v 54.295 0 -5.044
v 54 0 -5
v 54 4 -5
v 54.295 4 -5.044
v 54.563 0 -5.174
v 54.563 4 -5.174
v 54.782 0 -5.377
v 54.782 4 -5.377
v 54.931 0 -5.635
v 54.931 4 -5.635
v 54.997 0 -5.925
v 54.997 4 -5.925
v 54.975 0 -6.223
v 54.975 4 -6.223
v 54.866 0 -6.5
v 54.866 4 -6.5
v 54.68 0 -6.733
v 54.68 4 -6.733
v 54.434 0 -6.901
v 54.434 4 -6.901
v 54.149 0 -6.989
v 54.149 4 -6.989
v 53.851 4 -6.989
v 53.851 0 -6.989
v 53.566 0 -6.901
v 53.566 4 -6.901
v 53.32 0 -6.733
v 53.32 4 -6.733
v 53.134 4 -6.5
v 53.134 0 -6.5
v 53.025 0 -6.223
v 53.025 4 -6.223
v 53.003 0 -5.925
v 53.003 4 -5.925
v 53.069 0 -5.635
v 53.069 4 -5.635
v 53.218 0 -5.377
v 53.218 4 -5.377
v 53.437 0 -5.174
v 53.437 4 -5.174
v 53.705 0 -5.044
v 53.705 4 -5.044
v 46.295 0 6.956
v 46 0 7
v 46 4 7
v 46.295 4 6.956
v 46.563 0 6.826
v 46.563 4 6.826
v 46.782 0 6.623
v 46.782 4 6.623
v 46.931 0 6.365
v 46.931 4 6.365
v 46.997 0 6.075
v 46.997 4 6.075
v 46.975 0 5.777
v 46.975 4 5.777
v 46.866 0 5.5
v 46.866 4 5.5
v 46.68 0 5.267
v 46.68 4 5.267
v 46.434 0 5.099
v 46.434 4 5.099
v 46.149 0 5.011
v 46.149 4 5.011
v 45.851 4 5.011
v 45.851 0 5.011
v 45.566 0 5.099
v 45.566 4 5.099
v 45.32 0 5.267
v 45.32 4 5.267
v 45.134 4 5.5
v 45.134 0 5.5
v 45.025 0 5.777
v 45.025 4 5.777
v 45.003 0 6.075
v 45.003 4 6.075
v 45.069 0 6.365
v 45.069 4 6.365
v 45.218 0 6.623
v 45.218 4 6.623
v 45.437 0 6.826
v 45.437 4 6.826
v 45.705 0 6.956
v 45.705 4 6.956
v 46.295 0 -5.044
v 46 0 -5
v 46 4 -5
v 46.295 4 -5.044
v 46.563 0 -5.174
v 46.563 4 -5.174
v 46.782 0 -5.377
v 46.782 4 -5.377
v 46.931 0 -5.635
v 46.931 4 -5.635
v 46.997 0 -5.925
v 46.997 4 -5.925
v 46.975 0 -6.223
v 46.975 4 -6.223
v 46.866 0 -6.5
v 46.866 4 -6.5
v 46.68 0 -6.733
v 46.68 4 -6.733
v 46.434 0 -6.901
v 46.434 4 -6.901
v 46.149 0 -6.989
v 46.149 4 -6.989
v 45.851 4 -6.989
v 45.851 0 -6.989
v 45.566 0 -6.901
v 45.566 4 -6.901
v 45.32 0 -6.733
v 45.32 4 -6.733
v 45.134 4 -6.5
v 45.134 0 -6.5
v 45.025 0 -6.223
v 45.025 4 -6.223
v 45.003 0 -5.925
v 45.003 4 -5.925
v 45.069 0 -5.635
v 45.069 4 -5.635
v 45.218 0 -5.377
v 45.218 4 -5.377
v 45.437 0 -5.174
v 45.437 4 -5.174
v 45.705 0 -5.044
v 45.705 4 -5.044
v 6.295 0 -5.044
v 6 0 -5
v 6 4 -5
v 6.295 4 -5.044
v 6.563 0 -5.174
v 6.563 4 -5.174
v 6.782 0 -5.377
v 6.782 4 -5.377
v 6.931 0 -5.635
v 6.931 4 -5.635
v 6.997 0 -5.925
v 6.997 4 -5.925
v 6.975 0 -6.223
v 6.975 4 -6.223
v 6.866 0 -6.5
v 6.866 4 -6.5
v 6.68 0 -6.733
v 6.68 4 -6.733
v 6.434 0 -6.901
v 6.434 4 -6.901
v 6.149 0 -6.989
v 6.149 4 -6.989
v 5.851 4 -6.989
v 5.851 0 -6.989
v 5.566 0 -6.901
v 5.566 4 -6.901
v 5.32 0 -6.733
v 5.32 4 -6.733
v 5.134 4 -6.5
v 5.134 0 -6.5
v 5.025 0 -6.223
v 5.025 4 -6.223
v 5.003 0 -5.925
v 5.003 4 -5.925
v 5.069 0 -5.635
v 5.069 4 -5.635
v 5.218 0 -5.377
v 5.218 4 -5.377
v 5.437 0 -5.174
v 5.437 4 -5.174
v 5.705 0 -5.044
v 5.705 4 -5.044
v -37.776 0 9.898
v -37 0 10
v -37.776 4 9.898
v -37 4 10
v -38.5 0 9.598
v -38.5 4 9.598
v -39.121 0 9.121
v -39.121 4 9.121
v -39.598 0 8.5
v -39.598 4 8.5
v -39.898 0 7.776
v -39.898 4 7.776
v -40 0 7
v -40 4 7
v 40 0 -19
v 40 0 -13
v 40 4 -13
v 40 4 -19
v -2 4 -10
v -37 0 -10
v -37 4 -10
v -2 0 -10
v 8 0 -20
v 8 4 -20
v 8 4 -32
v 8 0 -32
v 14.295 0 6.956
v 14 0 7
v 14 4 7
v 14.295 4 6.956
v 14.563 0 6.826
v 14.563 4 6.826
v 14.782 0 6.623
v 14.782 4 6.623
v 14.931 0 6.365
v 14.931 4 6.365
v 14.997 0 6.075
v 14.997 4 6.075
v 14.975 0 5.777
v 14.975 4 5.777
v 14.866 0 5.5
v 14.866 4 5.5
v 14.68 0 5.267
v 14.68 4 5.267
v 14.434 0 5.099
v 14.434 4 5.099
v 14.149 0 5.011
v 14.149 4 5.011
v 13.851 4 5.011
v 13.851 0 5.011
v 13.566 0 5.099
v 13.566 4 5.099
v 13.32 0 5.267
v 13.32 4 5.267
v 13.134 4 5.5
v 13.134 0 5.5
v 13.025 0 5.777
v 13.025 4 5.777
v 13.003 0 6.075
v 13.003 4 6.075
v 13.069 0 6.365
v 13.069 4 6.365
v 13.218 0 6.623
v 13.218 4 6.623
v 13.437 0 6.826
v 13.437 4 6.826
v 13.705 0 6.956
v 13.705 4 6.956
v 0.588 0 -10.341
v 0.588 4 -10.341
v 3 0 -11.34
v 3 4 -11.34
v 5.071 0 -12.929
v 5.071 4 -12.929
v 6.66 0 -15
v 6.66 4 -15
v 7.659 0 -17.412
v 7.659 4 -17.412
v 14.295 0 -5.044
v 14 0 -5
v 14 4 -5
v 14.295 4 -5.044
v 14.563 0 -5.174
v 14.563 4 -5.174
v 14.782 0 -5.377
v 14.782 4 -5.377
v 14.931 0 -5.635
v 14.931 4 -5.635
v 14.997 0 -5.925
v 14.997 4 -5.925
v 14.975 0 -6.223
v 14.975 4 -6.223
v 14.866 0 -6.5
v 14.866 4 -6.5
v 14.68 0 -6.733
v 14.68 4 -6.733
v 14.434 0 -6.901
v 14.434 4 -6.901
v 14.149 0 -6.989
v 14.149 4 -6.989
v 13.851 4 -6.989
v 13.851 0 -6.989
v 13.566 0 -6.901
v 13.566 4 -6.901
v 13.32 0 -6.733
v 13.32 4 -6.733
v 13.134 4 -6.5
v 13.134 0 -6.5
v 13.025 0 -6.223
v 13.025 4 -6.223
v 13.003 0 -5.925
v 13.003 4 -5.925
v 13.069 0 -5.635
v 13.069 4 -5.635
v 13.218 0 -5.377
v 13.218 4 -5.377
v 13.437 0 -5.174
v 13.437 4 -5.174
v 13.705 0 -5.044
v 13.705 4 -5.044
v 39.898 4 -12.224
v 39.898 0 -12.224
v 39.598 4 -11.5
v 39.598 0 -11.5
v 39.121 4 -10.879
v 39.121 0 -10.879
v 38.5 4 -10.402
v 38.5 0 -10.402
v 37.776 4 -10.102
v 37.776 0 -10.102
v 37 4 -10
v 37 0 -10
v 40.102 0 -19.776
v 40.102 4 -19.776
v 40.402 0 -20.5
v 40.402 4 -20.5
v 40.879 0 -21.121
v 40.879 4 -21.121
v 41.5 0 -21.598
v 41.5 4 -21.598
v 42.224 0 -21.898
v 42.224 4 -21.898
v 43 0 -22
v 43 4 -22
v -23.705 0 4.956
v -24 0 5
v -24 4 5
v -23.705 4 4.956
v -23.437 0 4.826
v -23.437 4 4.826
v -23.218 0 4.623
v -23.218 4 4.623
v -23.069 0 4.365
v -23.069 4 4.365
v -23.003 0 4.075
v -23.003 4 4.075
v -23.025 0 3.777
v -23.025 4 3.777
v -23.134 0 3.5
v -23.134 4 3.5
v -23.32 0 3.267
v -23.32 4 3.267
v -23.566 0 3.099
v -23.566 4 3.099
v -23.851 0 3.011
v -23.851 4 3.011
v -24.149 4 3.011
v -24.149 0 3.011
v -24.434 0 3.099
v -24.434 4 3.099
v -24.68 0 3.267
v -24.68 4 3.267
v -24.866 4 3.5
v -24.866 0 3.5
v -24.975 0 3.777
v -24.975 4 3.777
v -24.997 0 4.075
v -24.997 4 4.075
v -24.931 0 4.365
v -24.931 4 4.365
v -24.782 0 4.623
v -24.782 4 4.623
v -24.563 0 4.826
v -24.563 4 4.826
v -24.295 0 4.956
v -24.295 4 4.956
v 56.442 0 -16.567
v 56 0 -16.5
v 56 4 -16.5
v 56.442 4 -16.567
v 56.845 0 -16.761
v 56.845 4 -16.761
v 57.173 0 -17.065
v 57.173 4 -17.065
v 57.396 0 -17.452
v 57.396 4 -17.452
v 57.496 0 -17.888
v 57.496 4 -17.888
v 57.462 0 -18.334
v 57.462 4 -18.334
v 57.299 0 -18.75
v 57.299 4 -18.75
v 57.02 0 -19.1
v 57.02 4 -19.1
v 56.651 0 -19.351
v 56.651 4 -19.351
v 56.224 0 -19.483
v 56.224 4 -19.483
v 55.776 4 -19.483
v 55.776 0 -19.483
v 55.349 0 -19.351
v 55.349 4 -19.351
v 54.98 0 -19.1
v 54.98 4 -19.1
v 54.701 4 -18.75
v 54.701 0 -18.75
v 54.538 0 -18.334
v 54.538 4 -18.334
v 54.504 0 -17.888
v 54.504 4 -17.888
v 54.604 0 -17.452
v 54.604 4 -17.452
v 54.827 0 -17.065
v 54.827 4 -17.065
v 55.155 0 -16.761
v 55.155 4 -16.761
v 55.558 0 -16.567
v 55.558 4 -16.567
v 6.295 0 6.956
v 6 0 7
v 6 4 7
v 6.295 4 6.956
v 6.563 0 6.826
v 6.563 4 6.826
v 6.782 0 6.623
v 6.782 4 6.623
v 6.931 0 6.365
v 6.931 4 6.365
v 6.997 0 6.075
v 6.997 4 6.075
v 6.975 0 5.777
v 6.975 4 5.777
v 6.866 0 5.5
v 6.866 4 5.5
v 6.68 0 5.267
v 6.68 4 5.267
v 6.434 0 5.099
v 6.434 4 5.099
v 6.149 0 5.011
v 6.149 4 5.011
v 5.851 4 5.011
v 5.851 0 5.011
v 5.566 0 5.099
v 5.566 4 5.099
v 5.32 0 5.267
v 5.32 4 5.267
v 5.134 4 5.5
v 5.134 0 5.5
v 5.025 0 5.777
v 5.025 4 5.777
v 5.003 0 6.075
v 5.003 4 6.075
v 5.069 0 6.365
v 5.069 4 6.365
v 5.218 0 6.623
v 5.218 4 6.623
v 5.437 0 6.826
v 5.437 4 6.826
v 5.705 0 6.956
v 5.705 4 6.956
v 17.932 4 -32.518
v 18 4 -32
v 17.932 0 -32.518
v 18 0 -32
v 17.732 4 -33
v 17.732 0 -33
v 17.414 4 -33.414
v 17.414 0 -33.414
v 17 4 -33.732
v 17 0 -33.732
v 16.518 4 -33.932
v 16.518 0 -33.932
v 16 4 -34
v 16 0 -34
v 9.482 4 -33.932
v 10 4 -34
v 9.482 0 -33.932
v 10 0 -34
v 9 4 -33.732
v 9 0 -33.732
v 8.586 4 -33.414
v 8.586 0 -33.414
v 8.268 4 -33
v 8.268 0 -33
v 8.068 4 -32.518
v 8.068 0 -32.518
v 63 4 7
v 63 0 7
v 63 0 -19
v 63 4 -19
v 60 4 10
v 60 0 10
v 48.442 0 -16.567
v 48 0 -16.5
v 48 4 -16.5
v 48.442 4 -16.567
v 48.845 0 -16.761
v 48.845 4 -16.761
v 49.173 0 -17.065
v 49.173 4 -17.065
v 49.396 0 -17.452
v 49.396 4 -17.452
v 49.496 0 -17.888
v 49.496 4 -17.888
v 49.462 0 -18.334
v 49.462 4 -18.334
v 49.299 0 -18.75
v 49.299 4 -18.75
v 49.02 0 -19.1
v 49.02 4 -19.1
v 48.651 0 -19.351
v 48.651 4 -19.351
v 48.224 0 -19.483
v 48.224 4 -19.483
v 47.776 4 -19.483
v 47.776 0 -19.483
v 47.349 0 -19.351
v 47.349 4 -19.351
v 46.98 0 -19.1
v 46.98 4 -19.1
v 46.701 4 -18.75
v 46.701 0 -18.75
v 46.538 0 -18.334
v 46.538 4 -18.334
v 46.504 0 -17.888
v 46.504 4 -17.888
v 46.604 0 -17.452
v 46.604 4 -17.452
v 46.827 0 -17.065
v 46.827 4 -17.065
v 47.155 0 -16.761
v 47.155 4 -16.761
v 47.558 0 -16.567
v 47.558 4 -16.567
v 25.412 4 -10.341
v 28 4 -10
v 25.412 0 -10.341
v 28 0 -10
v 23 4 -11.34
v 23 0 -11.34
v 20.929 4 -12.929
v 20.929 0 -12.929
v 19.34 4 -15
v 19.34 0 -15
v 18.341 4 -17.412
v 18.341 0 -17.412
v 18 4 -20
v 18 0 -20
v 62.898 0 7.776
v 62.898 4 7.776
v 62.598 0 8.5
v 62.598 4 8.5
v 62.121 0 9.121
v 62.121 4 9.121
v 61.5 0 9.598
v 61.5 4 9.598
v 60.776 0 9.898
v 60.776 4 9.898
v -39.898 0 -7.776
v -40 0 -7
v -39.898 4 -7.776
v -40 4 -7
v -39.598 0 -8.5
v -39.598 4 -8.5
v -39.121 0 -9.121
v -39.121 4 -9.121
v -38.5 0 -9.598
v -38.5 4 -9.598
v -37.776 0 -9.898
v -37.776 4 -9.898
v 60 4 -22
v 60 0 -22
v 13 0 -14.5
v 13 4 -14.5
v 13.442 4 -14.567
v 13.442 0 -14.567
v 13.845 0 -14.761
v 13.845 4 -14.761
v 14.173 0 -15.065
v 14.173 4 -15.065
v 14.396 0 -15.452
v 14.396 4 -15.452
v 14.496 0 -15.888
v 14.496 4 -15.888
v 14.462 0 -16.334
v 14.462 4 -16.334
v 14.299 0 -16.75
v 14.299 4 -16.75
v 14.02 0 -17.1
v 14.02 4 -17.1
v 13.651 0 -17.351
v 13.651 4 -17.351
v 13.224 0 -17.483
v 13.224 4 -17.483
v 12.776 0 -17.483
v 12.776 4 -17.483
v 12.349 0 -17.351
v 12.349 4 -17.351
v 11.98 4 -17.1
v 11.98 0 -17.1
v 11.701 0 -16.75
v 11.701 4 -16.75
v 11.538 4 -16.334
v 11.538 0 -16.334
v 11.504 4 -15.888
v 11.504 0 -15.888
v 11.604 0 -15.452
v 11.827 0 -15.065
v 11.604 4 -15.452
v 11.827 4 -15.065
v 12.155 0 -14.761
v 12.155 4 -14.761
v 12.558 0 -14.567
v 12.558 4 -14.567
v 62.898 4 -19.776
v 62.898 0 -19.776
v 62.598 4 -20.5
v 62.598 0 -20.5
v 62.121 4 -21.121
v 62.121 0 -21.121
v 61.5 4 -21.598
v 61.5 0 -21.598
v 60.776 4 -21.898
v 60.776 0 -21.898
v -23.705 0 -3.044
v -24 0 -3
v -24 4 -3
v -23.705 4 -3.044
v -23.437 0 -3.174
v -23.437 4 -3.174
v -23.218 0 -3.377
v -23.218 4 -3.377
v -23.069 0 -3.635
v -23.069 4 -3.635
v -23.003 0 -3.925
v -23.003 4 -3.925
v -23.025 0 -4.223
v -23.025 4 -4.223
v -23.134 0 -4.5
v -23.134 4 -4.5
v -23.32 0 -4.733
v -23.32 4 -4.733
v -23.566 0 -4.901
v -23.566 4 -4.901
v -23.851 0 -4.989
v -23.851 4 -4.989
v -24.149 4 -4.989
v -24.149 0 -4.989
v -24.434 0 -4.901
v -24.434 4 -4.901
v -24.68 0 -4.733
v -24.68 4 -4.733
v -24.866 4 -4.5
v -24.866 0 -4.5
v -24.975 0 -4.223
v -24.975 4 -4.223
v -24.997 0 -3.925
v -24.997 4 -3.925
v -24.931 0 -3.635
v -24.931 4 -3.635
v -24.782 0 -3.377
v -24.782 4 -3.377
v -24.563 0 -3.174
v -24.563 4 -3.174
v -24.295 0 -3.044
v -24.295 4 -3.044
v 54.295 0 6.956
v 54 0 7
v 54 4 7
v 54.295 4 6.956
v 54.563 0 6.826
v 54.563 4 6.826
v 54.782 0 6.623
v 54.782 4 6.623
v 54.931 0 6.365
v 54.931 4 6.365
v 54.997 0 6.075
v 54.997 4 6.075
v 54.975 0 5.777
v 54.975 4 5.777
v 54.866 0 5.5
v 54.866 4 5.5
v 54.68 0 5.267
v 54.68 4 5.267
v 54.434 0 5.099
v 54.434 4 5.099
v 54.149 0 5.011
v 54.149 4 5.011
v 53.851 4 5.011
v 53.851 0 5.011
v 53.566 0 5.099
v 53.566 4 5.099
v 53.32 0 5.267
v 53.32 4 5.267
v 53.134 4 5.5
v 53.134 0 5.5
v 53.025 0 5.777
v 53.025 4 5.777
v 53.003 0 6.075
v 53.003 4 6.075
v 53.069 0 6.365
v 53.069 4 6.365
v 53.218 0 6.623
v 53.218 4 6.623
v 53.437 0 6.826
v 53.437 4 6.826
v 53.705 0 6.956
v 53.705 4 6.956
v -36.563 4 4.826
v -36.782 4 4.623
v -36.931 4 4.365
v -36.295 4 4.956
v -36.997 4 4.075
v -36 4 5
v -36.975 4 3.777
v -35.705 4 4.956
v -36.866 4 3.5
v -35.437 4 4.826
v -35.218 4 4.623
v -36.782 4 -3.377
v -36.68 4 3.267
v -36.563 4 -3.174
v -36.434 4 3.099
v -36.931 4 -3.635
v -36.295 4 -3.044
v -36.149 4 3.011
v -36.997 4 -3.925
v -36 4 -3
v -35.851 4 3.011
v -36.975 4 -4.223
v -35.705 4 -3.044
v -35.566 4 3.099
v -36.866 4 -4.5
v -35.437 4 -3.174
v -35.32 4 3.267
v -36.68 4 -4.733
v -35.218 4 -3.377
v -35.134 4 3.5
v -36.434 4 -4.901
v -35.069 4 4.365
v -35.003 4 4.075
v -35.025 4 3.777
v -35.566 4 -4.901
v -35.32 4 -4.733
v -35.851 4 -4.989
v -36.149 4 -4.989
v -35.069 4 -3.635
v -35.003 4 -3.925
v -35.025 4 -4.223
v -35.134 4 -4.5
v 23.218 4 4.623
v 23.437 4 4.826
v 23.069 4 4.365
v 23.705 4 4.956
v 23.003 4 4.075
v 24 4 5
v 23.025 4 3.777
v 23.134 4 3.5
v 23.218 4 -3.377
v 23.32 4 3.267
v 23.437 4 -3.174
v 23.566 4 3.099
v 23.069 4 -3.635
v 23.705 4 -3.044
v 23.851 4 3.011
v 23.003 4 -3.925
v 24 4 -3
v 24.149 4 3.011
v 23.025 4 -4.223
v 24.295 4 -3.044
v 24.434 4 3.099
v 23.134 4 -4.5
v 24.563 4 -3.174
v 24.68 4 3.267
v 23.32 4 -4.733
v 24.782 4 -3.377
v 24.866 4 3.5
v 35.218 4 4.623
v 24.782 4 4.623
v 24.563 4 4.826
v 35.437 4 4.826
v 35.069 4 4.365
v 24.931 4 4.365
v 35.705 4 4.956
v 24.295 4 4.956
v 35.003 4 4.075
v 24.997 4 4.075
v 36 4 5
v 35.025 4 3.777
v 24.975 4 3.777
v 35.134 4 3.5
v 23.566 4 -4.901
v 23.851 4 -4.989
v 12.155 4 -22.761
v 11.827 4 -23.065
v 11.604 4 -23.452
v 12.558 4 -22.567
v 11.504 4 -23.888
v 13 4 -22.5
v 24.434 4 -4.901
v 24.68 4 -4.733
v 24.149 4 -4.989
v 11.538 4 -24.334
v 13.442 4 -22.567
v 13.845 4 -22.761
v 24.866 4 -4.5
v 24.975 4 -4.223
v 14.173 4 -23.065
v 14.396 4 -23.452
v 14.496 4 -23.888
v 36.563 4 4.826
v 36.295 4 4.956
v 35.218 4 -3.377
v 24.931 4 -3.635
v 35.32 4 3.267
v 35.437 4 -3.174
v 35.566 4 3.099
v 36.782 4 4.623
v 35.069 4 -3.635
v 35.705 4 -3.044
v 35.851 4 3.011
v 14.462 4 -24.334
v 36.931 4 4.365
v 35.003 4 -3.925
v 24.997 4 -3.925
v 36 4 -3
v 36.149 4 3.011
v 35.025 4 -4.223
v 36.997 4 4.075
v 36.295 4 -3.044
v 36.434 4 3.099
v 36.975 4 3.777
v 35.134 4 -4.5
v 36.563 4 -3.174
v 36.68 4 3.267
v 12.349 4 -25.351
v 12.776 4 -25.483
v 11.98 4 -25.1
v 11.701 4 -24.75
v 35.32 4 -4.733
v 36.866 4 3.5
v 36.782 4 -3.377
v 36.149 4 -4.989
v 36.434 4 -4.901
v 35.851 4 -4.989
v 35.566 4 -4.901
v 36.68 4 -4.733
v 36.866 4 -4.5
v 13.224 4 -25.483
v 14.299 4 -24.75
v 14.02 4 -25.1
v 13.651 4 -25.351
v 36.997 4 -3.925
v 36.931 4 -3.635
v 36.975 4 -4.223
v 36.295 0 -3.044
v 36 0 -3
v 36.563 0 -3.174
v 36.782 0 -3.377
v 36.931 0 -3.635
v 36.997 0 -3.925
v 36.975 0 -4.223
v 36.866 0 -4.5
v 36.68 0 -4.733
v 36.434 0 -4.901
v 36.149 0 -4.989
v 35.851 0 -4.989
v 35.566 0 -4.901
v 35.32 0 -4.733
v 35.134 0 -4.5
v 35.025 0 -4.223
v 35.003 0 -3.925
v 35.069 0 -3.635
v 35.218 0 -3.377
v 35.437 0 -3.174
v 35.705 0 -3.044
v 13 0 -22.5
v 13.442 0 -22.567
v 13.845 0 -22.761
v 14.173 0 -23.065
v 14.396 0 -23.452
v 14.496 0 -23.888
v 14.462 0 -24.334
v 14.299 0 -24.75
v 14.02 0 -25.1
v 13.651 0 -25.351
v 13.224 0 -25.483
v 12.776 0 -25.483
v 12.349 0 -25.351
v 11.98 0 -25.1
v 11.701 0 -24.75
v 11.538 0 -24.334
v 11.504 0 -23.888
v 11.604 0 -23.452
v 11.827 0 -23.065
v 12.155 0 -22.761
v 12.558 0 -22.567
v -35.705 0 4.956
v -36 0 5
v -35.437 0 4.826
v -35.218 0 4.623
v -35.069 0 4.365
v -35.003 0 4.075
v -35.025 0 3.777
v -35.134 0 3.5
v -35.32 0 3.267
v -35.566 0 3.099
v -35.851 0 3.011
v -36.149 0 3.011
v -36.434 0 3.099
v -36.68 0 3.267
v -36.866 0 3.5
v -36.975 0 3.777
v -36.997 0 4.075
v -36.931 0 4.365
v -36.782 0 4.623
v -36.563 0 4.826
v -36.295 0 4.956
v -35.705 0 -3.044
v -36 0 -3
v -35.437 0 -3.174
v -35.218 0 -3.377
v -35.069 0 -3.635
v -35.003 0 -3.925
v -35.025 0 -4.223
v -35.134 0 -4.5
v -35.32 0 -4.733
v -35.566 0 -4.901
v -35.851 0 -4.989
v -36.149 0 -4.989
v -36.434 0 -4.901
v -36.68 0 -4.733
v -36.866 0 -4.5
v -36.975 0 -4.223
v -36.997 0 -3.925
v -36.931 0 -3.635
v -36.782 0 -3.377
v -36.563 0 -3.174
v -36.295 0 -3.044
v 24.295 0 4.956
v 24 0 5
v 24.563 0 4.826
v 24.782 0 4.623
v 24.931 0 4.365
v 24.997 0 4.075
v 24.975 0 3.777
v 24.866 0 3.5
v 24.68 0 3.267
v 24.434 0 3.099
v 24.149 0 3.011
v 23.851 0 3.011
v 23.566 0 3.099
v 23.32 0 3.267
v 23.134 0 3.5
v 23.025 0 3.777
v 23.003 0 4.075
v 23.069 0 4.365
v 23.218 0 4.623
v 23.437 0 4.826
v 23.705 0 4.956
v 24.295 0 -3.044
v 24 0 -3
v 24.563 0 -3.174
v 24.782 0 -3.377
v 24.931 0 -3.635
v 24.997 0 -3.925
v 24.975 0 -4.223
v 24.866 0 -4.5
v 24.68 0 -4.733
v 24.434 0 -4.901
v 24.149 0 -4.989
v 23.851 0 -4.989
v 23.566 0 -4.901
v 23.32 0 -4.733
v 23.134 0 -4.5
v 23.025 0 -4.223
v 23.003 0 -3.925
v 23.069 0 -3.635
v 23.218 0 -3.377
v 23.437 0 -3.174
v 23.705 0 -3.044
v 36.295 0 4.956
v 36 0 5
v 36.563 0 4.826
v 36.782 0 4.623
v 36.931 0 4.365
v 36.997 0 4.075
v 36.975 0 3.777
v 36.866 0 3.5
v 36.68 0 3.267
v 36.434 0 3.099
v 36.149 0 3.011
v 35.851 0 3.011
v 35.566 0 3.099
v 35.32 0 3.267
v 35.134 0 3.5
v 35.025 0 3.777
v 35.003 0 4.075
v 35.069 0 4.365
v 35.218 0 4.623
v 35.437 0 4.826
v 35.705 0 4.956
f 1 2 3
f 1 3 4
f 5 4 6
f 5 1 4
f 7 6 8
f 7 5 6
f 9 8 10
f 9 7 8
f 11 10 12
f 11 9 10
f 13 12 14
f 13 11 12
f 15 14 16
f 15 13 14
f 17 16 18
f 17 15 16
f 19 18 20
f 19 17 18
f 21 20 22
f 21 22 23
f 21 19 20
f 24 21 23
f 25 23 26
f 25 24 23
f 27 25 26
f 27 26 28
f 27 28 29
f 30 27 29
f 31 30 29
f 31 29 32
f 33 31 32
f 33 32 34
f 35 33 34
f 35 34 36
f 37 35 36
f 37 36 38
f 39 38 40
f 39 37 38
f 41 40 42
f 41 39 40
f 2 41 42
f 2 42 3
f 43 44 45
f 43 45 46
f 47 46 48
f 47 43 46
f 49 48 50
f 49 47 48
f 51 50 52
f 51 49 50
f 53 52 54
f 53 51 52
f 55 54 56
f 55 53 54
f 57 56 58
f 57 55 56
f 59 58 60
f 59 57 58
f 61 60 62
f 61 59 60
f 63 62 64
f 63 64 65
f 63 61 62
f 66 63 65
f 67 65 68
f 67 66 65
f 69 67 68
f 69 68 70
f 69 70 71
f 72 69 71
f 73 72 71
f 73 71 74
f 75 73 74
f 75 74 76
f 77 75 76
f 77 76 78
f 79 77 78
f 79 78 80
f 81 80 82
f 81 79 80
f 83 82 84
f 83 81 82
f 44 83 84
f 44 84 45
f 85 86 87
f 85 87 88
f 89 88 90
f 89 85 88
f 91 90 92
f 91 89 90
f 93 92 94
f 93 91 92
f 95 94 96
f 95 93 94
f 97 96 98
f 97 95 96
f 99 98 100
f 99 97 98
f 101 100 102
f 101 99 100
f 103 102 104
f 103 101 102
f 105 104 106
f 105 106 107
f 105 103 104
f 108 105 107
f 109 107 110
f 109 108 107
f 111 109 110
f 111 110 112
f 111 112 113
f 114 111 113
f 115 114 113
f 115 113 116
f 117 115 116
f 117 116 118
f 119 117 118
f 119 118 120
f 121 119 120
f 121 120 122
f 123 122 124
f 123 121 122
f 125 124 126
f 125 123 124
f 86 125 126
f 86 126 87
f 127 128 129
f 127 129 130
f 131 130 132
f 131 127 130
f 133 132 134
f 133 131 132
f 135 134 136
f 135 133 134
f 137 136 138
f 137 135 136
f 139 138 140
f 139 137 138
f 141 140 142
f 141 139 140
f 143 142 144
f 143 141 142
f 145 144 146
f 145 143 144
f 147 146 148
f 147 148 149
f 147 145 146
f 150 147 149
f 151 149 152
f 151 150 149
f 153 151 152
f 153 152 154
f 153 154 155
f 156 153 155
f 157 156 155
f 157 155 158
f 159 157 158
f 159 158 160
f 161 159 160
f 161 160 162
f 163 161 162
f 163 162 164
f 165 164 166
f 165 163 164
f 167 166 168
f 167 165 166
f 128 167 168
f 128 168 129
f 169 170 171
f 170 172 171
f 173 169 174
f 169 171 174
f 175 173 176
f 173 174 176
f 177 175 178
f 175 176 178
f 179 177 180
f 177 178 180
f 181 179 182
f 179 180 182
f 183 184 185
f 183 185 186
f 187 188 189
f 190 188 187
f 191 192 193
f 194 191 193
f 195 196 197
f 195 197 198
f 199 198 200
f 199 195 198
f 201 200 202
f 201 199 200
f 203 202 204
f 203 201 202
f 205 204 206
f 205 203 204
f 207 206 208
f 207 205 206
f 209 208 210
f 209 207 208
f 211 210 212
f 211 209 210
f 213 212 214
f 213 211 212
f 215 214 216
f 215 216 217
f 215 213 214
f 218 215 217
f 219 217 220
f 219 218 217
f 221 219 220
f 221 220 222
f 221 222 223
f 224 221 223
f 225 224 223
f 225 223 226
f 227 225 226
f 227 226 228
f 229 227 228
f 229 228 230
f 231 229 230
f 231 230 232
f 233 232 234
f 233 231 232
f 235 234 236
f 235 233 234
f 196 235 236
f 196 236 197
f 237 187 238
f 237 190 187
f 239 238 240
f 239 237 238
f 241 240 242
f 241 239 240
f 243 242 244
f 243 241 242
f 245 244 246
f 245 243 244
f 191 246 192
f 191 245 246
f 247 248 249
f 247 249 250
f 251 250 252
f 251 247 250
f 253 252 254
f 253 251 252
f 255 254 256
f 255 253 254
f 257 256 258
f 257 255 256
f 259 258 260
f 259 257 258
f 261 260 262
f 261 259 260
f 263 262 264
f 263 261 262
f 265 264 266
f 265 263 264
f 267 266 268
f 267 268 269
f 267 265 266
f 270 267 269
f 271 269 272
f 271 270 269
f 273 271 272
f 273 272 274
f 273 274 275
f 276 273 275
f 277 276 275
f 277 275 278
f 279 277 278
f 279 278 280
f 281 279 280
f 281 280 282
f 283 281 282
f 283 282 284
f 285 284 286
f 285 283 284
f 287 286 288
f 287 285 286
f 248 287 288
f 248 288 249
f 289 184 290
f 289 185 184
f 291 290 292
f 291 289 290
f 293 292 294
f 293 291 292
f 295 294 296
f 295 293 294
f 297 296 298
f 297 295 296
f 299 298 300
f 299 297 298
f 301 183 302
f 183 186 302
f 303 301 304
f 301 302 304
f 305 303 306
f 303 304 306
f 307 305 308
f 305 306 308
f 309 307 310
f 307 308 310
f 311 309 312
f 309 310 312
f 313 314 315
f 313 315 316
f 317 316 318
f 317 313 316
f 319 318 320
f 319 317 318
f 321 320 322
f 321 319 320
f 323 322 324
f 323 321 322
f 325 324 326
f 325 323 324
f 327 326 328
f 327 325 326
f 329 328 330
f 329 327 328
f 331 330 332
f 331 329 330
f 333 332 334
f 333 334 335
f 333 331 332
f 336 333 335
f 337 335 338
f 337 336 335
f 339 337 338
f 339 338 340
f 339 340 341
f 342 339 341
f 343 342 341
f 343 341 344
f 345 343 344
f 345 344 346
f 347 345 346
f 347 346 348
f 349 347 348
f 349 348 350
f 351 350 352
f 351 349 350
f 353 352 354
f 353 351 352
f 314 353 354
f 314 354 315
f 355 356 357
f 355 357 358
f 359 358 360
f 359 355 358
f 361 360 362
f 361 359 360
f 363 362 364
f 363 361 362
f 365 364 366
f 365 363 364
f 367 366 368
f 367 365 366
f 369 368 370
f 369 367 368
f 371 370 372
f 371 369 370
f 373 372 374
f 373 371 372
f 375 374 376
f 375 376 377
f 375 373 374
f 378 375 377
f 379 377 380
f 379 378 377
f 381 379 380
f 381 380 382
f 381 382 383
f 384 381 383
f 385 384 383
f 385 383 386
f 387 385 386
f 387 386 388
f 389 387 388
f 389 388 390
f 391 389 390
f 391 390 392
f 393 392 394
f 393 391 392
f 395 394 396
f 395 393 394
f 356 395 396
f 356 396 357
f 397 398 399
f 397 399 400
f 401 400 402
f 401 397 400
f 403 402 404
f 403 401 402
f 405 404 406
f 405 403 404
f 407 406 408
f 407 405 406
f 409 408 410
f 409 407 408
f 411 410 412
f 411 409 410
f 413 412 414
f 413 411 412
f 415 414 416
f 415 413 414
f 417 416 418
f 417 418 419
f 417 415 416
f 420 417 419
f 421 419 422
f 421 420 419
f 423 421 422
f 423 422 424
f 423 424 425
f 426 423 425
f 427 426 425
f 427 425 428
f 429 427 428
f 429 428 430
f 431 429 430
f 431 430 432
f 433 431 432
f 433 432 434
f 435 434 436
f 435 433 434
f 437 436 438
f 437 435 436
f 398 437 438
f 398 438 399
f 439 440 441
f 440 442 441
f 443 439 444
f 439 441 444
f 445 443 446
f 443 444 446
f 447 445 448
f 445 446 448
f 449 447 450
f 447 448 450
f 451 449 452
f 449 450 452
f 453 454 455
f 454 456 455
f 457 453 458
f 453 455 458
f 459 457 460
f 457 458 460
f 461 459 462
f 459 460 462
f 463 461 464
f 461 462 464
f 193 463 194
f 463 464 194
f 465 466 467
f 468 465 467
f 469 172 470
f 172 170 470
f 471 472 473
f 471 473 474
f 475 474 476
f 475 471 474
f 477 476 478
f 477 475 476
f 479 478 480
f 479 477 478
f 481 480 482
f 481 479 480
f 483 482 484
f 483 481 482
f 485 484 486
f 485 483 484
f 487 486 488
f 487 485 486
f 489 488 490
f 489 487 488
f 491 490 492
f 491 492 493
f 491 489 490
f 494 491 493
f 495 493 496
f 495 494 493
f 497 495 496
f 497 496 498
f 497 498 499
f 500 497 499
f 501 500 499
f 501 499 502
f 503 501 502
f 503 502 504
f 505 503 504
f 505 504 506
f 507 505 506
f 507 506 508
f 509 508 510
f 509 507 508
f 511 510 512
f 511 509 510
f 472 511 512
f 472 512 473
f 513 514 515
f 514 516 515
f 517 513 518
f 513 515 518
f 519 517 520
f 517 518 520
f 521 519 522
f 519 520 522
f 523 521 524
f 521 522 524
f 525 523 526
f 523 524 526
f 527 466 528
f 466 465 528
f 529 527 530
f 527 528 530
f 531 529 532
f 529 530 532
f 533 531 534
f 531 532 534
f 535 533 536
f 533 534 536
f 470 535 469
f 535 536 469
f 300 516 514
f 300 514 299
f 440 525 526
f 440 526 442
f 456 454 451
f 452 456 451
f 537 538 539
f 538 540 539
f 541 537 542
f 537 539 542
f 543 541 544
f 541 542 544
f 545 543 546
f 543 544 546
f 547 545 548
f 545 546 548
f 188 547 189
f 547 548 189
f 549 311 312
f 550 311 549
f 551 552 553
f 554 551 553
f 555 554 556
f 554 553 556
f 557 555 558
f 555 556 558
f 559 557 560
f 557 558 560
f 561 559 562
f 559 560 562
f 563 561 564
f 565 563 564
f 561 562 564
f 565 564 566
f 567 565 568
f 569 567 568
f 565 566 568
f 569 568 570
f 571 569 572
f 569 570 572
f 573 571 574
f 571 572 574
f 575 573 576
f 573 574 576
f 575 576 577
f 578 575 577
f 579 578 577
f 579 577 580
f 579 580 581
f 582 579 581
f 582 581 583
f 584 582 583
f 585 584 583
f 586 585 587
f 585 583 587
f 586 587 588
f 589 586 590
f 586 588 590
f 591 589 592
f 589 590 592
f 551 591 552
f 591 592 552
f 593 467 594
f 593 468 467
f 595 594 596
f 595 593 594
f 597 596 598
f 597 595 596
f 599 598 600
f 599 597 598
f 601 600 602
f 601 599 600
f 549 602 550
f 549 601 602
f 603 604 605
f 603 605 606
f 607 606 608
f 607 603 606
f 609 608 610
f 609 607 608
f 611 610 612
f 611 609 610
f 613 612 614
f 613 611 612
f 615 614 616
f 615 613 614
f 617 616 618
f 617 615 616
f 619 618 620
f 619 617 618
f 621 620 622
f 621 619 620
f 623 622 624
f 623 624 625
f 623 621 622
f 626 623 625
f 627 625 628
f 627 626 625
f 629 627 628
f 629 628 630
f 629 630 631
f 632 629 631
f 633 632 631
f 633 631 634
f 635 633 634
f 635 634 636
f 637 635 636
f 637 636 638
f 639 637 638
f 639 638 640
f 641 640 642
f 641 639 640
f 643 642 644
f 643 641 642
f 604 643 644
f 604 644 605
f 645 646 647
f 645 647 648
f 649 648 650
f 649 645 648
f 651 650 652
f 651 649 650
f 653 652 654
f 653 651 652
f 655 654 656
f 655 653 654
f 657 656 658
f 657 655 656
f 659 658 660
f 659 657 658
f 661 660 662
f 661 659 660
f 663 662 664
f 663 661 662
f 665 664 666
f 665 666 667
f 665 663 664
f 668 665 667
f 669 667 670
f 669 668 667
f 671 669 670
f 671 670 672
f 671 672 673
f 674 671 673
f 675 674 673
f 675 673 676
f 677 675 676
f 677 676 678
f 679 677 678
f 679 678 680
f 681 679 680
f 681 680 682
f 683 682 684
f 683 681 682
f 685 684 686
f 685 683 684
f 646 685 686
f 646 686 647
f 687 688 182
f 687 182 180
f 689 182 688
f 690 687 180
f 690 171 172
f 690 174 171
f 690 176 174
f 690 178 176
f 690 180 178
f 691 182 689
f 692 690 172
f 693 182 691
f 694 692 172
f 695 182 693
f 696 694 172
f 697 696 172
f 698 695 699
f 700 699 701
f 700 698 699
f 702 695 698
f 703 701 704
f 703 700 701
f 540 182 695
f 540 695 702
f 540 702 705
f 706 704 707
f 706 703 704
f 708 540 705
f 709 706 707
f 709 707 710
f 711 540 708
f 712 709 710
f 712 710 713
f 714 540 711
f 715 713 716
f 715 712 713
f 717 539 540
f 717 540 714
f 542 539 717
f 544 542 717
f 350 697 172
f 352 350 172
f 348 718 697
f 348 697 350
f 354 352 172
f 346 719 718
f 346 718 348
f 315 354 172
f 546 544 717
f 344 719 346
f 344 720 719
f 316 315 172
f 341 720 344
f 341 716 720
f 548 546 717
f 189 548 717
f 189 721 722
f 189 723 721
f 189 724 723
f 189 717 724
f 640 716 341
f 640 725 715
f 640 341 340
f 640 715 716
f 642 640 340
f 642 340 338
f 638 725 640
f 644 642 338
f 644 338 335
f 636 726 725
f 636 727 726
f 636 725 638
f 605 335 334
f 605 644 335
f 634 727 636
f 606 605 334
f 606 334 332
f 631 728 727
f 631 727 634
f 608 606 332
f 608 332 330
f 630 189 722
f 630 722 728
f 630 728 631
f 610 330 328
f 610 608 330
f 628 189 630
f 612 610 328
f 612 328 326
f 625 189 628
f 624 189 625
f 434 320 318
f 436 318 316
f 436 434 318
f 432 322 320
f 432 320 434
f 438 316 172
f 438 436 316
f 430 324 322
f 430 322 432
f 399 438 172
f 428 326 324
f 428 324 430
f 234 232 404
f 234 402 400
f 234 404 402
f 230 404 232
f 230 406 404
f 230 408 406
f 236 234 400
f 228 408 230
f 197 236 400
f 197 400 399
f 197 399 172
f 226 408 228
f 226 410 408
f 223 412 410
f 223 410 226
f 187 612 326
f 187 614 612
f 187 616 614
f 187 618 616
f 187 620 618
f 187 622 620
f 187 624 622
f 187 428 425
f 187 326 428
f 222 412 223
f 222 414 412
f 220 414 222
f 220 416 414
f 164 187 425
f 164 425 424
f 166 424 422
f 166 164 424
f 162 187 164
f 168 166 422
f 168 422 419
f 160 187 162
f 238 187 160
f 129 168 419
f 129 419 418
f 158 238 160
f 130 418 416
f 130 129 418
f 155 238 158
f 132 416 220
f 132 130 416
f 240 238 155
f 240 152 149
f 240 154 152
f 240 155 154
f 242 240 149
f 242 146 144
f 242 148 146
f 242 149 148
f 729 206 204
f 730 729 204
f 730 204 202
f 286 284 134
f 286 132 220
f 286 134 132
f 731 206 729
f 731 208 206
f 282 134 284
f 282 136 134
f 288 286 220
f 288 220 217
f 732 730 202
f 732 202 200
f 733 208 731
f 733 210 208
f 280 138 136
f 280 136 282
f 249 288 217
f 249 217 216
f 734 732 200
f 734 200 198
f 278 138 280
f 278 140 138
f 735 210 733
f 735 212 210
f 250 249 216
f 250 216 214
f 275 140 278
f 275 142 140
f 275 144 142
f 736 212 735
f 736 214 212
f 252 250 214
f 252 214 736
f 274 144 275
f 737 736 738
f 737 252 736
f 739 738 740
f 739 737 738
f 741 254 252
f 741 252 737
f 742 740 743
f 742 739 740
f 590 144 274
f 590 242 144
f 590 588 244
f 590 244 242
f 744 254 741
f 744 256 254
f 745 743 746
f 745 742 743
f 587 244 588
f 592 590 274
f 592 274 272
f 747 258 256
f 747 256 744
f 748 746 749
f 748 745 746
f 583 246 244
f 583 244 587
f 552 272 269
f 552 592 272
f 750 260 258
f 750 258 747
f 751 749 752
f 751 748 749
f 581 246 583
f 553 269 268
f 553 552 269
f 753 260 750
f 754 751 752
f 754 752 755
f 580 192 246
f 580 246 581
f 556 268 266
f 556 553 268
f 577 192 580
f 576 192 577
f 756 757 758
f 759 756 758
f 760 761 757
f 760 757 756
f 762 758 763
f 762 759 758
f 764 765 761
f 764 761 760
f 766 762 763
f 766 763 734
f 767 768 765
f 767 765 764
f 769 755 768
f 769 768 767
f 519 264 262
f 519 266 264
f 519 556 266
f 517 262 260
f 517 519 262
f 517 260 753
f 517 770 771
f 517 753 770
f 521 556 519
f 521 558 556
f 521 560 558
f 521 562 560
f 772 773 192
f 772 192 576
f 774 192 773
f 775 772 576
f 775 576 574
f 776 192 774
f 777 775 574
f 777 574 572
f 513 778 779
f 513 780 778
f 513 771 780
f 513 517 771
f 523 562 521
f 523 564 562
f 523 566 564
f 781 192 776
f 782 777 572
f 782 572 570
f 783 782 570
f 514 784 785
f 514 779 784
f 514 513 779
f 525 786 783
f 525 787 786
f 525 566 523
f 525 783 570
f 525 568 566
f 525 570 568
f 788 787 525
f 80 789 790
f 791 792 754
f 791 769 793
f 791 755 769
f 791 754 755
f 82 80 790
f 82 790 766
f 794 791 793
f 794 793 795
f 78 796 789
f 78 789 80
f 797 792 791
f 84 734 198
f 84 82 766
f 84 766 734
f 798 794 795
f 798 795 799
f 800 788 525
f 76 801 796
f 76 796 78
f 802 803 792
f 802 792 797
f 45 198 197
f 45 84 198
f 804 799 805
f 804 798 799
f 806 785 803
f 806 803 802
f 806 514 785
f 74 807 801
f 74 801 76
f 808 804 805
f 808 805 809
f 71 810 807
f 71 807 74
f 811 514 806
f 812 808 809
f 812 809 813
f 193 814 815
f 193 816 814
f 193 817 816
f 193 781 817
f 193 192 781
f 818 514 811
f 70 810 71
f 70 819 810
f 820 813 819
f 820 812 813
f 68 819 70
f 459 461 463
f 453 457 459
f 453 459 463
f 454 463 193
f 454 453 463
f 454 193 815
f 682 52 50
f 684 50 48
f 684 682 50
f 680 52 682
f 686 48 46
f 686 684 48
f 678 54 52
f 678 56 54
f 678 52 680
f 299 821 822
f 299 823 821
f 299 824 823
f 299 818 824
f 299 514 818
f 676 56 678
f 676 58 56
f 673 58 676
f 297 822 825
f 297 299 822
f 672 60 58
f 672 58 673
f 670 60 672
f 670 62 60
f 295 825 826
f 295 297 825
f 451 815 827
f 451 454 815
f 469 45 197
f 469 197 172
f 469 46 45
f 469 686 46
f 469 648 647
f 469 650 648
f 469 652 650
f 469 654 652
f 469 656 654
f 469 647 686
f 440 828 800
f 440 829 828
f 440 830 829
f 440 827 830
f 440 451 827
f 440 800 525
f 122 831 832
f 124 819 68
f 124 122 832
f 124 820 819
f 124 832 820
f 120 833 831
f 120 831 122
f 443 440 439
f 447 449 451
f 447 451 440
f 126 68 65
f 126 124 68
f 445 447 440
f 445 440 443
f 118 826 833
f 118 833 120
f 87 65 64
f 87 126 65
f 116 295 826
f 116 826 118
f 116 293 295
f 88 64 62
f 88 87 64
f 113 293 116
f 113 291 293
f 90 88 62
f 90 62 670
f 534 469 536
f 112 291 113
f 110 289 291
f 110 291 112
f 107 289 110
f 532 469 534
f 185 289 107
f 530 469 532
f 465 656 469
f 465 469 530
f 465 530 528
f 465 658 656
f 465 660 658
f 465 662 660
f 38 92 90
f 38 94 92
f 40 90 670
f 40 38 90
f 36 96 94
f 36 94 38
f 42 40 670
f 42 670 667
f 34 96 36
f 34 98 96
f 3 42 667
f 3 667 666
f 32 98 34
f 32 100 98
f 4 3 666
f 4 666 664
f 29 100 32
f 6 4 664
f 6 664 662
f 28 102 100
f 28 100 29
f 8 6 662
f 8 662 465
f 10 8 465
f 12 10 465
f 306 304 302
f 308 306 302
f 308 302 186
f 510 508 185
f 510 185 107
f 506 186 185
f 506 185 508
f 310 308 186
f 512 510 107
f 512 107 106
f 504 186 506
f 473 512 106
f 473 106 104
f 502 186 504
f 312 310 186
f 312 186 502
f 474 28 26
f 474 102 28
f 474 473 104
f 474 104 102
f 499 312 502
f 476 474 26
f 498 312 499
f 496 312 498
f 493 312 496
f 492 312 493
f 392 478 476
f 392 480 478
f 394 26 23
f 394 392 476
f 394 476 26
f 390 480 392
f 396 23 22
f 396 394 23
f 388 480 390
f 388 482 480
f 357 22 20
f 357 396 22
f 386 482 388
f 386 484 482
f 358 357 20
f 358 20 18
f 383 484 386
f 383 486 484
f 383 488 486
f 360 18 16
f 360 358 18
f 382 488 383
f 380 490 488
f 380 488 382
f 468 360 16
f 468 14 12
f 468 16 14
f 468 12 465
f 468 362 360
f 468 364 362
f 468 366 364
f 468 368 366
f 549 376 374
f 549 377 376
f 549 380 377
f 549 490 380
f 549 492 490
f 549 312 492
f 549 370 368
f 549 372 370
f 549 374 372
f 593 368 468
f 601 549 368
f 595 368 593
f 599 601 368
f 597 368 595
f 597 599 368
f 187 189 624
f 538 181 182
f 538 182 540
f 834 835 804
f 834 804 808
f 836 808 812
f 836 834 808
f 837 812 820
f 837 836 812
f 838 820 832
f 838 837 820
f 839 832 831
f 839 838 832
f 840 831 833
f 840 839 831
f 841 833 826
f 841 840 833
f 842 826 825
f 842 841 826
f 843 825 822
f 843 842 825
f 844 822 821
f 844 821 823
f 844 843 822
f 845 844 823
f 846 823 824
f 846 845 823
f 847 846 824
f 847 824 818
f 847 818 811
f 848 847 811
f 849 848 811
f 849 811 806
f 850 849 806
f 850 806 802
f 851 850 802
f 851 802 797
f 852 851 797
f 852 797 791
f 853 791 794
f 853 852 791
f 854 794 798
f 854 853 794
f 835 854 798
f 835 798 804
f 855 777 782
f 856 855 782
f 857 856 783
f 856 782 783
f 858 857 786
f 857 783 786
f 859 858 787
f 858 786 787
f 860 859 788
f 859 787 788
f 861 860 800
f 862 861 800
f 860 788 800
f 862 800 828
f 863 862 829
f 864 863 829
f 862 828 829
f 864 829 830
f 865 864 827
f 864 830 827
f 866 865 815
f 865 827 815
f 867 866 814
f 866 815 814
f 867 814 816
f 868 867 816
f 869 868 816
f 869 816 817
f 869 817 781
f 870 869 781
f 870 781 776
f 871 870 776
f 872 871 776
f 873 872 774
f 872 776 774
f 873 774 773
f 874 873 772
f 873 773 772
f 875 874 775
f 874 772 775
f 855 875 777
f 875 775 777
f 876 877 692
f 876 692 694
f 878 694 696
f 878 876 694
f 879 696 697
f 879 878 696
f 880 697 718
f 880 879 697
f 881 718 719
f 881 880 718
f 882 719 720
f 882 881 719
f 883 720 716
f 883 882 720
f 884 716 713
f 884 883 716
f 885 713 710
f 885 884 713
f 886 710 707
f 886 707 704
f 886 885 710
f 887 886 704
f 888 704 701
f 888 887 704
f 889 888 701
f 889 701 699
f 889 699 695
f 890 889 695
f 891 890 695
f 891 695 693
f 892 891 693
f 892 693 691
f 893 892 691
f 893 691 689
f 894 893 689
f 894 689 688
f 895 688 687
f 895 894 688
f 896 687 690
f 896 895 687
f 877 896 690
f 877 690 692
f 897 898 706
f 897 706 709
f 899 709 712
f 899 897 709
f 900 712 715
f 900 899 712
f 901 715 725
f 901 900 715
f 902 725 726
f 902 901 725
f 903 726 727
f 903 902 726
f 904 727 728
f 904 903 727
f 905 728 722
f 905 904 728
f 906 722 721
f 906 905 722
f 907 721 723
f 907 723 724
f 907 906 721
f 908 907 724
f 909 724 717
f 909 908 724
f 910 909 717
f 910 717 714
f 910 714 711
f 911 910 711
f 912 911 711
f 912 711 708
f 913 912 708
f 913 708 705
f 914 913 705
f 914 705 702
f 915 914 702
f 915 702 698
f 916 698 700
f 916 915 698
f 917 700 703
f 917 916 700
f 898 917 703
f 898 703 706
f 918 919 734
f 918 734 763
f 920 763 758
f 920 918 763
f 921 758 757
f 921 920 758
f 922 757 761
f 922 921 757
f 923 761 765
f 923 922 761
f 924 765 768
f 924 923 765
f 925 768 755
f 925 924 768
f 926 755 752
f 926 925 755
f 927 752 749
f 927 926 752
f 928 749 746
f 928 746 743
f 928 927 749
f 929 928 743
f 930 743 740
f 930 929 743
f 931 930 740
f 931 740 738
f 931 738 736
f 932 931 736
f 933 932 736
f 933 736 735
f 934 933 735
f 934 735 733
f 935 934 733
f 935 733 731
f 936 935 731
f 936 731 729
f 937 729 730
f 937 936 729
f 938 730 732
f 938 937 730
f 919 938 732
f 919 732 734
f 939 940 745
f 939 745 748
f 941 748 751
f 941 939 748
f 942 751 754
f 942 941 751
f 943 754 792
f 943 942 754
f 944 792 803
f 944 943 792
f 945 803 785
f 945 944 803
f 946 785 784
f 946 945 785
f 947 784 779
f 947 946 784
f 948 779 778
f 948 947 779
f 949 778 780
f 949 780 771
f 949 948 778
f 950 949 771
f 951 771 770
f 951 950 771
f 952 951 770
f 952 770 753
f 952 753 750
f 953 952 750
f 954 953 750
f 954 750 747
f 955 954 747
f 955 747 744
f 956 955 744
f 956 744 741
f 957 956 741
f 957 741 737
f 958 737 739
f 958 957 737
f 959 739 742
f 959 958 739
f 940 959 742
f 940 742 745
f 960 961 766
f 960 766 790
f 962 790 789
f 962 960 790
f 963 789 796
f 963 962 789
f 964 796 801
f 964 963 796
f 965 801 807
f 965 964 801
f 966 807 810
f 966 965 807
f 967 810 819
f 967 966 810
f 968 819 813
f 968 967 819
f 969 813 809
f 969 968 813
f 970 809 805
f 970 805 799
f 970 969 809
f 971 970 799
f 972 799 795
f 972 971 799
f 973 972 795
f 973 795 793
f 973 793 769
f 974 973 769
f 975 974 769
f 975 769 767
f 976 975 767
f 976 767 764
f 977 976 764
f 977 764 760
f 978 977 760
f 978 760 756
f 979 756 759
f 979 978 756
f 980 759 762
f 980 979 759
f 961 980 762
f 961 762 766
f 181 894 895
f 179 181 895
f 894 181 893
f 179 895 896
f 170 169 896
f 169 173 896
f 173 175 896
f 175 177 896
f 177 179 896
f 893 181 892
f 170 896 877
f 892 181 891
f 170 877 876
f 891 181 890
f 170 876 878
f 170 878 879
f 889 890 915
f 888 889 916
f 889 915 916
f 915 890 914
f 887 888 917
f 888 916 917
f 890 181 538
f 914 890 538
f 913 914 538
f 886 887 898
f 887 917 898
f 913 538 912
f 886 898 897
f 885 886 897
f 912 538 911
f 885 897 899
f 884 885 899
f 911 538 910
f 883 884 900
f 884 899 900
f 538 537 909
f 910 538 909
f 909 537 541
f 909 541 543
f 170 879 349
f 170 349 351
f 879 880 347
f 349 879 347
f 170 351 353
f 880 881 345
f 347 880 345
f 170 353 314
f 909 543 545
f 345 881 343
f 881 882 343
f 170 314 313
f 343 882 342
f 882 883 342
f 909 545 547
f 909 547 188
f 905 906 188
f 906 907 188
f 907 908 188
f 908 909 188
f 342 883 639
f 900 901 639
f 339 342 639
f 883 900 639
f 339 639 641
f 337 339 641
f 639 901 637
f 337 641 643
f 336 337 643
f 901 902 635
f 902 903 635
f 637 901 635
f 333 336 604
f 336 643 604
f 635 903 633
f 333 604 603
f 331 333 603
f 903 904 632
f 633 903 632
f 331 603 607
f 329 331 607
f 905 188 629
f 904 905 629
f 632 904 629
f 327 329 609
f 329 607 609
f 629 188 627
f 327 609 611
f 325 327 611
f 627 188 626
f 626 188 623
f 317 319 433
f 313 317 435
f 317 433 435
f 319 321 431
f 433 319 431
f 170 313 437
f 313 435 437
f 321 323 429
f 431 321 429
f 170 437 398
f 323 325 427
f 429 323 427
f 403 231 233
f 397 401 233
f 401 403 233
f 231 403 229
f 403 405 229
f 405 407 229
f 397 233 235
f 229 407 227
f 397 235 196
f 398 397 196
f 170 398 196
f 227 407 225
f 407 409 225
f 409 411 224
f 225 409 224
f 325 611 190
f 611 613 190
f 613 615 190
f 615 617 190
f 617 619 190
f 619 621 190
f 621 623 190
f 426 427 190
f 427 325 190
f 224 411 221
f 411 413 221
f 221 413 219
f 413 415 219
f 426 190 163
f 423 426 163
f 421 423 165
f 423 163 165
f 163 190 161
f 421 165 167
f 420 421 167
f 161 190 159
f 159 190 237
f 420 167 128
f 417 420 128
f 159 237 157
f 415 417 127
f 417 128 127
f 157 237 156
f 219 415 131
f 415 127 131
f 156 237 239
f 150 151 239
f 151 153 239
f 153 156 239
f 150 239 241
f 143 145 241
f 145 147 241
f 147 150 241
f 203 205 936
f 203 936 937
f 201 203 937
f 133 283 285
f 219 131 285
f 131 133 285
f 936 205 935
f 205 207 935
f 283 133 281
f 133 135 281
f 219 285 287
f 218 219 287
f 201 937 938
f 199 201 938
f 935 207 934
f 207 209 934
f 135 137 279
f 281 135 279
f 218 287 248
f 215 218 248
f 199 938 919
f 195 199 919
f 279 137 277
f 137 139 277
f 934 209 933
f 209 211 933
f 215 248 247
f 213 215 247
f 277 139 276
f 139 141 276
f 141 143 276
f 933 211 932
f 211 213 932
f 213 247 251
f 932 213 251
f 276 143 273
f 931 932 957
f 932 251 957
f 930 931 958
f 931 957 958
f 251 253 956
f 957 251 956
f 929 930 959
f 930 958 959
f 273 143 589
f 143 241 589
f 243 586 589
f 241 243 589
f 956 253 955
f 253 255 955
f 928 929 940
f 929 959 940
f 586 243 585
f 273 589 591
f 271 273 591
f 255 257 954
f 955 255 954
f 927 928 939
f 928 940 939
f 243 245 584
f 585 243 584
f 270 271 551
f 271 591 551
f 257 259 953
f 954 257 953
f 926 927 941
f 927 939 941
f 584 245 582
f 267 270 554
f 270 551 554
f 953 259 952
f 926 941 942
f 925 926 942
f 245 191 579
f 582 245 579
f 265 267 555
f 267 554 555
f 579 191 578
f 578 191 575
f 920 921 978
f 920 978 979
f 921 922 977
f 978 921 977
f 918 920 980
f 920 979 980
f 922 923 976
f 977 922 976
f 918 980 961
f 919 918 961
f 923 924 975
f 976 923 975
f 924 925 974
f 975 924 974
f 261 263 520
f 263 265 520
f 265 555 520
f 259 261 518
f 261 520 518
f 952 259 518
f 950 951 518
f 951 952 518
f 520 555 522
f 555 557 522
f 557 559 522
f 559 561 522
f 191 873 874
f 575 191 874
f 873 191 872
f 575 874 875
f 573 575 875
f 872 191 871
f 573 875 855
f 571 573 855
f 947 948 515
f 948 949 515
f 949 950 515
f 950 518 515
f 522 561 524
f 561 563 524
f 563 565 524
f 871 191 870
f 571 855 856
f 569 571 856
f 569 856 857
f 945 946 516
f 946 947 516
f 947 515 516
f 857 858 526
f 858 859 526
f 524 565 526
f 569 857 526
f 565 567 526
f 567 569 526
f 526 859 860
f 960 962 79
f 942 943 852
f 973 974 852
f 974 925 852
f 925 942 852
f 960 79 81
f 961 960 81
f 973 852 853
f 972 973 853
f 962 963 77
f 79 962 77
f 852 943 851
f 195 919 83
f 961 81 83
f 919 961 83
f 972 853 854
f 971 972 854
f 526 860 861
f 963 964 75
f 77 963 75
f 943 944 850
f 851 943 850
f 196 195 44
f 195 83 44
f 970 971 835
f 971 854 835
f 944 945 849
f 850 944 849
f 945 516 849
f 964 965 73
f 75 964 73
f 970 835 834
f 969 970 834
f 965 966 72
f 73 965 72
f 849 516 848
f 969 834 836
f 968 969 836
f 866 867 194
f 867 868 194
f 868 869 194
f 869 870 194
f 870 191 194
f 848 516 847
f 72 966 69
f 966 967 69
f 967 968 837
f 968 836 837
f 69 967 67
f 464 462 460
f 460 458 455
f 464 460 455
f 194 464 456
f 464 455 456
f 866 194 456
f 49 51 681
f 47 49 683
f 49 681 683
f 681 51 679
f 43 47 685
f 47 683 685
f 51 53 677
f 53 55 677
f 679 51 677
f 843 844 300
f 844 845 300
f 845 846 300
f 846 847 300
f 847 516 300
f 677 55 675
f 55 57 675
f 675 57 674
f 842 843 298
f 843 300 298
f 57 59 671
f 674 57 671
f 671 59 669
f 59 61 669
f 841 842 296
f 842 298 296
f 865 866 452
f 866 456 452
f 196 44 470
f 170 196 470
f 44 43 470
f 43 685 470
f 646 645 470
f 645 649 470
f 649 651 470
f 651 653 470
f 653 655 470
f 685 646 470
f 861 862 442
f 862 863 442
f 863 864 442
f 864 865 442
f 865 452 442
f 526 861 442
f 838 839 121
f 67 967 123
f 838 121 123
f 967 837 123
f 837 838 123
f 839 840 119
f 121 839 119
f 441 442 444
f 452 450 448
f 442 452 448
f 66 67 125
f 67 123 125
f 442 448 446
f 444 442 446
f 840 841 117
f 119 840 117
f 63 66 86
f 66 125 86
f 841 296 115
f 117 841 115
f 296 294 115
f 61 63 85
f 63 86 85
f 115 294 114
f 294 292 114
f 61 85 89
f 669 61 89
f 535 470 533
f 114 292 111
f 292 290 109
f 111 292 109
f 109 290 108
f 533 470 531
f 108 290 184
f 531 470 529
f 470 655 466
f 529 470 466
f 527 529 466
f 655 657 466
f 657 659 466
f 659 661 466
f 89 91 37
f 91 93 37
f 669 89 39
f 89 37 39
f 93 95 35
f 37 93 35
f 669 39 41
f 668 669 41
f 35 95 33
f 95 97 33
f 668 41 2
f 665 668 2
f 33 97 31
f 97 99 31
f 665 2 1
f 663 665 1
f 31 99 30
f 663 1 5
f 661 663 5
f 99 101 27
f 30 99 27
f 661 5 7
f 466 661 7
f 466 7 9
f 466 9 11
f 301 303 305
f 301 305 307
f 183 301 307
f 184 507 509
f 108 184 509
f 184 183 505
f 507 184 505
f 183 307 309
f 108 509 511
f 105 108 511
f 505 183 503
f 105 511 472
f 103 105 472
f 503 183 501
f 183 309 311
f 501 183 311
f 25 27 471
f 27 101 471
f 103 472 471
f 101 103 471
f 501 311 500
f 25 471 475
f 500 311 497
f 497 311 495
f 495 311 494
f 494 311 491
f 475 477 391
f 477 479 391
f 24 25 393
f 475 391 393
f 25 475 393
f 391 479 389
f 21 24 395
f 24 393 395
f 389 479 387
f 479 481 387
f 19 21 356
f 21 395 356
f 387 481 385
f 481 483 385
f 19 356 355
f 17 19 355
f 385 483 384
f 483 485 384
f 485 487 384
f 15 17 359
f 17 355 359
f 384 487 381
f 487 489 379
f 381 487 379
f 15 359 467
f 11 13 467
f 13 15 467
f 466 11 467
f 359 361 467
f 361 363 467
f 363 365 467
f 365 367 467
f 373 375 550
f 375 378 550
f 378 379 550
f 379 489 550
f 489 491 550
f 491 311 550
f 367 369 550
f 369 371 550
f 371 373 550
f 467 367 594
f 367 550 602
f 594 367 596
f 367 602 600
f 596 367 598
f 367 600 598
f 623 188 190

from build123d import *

# Parameters (mm, degrees)
SKETCH_1_W      = 80
SKETCH_1_H      = 20
SKETCH_1_R      = 1
SKETCH_1_W_2    = 23
SKETCH_1_H_2    = 12
SKETCH_1_R_2    = 1.5
EXTRUDE_1_DEPTH = 4
FILLET_1_R      = 3
SKETCH_2_W      = 10
SKETCH_2_H      = 24
SKETCH_2_R      = 1.5
EXTRUDE_2_DEPTH = 4
FILLET_2_R      = 10
FILLET_3_R      = 2


with BuildPart() as part:
    # 草图1 → 凸台-拉伸1 (new body)
    # profile 1 of 3: a face of its own
    with BuildSketch(Plane(origin=(0, 0, 0), x_dir=(1, 0, 0), z_dir=(0, 1, 0))):
        Rectangle(SKETCH_1_W, SKETCH_1_H)
        with Locations(Location((-36, -4, 0), (0, 0, 270))):
            Circle(SKETCH_1_R, mode=Mode.SUBTRACT)
        with Locations(Location((-24, -4, 0), (0, 0, 270))):
            Circle(SKETCH_1_R, mode=Mode.SUBTRACT)
        with Locations(Location((36, 4, 0), (0, 0, 270))):
            Circle(SKETCH_1_R, mode=Mode.SUBTRACT)
        with Locations(Location((24, 4, 0), (0, 0, 270))):
            Circle(SKETCH_1_R, mode=Mode.SUBTRACT)
        with Locations(Location((14, 6, 0), (0, 0, 270))):
            Circle(SKETCH_1_R, mode=Mode.SUBTRACT)
        with Locations(Location((6, 6, 0), (0, 0, 270))):
            Circle(SKETCH_1_R, mode=Mode.SUBTRACT)
        with Locations(Location((14, -6, 0), (0, 0, 270))):
            Circle(SKETCH_1_R, mode=Mode.SUBTRACT)
        with Locations(Location((6, -6, 0), (0, 0, 270))):
            Circle(SKETCH_1_R, mode=Mode.SUBTRACT)
        with Locations(Location((36, -4, 0), (0, 0, 270))):
            Circle(SKETCH_1_R, mode=Mode.SUBTRACT)
        with Locations(Location((24, -4, 0), (0, 0, 270))):
            Circle(SKETCH_1_R, mode=Mode.SUBTRACT)
        with Locations(Location((-36, 4, 0), (0, 0, 270))):
            Circle(SKETCH_1_R, mode=Mode.SUBTRACT)
        with Locations(Location((-24, 4, 0), (0, 0, 270))):
            Circle(SKETCH_1_R, mode=Mode.SUBTRACT)
    # profile 2 of 3: a face of its own
    with BuildSketch(Plane(origin=(0, 0, 0), x_dir=(1, 0, 0), z_dir=(0, 1, 0))):
        with Locations((51.5, 0)):
            Rectangle(SKETCH_1_W_2, SKETCH_1_H)
        with Locations(Location((46, -6, 0), (0, 0, 270))):
            Circle(SKETCH_1_R, mode=Mode.SUBTRACT)
        with Locations(Location((46, 6, 0), (0, 0, 270))):
            Circle(SKETCH_1_R, mode=Mode.SUBTRACT)
        with Locations(Location((54, -6, 0), (0, 0, 270))):
            Circle(SKETCH_1_R, mode=Mode.SUBTRACT)
        with Locations(Location((54, 6, 0), (0, 0, 270))):
            Circle(SKETCH_1_R, mode=Mode.SUBTRACT)
    # profile 3 of 3: a face of its own
    with BuildSketch(Plane(origin=(0, 0, 0), x_dir=(1, 0, 0), z_dir=(0, 1, 0))):
        with Locations((51.5, 16)):
            Rectangle(SKETCH_1_W_2, SKETCH_1_H_2)
        with Locations(Location((56, 18, 0), (0, 0, 270))):
            Circle(SKETCH_1_R_2, mode=Mode.SUBTRACT)
        with Locations(Location((48, 18, 0), (0, 0, 270))):
            Circle(SKETCH_1_R_2, mode=Mode.SUBTRACT)
    extrude(amount=EXTRUDE_1_DEPTH)

    # 圆角1
    fillet_1_edges = [part.edges().sort_by_distance(p)[0] for p in [
        (-40, 2, 10),
        (-40, 2, -10),
        (40, 2, -10),
        (40, 2, -22),
        (63, 2, -22),
        (63, 2, 10),
    ]]
    fillet(fillet_1_edges, radius=FILLET_1_R)

    # 草图2 → 凸台-拉伸2 (add)
    with BuildSketch(Plane(origin=(0, 4, 0), x_dir=(1, 0, 0), z_dir=(0, 1, 0))):
        with Locations((13, 22)):
            Rectangle(SKETCH_2_W, SKETCH_2_H)
        with Locations(Location((13, 24, 0), (0, 0, 270))):
            Circle(SKETCH_2_R, mode=Mode.SUBTRACT)
        with Locations(Location((13, 16, 0), (0, 0, 270))):
            Circle(SKETCH_2_R, mode=Mode.SUBTRACT)
    extrude(amount=-EXTRUDE_2_DEPTH)

    # 圆角2
    fillet_2_edges = [part.edges().sort_by_distance(p)[0] for p in [
        (18, 2, -10),
        (8, 2, -10),
    ]]
    fillet(fillet_2_edges, radius=FILLET_2_R)

    # 圆角3
    fillet_3_edges = [part.edges().sort_by_distance(p)[0] for p in [
        (8, 2, -34),
        (18, 2, -34),
    ]]
    fillet(fillet_3_edges, radius=FILLET_3_R)


solid = part.part
